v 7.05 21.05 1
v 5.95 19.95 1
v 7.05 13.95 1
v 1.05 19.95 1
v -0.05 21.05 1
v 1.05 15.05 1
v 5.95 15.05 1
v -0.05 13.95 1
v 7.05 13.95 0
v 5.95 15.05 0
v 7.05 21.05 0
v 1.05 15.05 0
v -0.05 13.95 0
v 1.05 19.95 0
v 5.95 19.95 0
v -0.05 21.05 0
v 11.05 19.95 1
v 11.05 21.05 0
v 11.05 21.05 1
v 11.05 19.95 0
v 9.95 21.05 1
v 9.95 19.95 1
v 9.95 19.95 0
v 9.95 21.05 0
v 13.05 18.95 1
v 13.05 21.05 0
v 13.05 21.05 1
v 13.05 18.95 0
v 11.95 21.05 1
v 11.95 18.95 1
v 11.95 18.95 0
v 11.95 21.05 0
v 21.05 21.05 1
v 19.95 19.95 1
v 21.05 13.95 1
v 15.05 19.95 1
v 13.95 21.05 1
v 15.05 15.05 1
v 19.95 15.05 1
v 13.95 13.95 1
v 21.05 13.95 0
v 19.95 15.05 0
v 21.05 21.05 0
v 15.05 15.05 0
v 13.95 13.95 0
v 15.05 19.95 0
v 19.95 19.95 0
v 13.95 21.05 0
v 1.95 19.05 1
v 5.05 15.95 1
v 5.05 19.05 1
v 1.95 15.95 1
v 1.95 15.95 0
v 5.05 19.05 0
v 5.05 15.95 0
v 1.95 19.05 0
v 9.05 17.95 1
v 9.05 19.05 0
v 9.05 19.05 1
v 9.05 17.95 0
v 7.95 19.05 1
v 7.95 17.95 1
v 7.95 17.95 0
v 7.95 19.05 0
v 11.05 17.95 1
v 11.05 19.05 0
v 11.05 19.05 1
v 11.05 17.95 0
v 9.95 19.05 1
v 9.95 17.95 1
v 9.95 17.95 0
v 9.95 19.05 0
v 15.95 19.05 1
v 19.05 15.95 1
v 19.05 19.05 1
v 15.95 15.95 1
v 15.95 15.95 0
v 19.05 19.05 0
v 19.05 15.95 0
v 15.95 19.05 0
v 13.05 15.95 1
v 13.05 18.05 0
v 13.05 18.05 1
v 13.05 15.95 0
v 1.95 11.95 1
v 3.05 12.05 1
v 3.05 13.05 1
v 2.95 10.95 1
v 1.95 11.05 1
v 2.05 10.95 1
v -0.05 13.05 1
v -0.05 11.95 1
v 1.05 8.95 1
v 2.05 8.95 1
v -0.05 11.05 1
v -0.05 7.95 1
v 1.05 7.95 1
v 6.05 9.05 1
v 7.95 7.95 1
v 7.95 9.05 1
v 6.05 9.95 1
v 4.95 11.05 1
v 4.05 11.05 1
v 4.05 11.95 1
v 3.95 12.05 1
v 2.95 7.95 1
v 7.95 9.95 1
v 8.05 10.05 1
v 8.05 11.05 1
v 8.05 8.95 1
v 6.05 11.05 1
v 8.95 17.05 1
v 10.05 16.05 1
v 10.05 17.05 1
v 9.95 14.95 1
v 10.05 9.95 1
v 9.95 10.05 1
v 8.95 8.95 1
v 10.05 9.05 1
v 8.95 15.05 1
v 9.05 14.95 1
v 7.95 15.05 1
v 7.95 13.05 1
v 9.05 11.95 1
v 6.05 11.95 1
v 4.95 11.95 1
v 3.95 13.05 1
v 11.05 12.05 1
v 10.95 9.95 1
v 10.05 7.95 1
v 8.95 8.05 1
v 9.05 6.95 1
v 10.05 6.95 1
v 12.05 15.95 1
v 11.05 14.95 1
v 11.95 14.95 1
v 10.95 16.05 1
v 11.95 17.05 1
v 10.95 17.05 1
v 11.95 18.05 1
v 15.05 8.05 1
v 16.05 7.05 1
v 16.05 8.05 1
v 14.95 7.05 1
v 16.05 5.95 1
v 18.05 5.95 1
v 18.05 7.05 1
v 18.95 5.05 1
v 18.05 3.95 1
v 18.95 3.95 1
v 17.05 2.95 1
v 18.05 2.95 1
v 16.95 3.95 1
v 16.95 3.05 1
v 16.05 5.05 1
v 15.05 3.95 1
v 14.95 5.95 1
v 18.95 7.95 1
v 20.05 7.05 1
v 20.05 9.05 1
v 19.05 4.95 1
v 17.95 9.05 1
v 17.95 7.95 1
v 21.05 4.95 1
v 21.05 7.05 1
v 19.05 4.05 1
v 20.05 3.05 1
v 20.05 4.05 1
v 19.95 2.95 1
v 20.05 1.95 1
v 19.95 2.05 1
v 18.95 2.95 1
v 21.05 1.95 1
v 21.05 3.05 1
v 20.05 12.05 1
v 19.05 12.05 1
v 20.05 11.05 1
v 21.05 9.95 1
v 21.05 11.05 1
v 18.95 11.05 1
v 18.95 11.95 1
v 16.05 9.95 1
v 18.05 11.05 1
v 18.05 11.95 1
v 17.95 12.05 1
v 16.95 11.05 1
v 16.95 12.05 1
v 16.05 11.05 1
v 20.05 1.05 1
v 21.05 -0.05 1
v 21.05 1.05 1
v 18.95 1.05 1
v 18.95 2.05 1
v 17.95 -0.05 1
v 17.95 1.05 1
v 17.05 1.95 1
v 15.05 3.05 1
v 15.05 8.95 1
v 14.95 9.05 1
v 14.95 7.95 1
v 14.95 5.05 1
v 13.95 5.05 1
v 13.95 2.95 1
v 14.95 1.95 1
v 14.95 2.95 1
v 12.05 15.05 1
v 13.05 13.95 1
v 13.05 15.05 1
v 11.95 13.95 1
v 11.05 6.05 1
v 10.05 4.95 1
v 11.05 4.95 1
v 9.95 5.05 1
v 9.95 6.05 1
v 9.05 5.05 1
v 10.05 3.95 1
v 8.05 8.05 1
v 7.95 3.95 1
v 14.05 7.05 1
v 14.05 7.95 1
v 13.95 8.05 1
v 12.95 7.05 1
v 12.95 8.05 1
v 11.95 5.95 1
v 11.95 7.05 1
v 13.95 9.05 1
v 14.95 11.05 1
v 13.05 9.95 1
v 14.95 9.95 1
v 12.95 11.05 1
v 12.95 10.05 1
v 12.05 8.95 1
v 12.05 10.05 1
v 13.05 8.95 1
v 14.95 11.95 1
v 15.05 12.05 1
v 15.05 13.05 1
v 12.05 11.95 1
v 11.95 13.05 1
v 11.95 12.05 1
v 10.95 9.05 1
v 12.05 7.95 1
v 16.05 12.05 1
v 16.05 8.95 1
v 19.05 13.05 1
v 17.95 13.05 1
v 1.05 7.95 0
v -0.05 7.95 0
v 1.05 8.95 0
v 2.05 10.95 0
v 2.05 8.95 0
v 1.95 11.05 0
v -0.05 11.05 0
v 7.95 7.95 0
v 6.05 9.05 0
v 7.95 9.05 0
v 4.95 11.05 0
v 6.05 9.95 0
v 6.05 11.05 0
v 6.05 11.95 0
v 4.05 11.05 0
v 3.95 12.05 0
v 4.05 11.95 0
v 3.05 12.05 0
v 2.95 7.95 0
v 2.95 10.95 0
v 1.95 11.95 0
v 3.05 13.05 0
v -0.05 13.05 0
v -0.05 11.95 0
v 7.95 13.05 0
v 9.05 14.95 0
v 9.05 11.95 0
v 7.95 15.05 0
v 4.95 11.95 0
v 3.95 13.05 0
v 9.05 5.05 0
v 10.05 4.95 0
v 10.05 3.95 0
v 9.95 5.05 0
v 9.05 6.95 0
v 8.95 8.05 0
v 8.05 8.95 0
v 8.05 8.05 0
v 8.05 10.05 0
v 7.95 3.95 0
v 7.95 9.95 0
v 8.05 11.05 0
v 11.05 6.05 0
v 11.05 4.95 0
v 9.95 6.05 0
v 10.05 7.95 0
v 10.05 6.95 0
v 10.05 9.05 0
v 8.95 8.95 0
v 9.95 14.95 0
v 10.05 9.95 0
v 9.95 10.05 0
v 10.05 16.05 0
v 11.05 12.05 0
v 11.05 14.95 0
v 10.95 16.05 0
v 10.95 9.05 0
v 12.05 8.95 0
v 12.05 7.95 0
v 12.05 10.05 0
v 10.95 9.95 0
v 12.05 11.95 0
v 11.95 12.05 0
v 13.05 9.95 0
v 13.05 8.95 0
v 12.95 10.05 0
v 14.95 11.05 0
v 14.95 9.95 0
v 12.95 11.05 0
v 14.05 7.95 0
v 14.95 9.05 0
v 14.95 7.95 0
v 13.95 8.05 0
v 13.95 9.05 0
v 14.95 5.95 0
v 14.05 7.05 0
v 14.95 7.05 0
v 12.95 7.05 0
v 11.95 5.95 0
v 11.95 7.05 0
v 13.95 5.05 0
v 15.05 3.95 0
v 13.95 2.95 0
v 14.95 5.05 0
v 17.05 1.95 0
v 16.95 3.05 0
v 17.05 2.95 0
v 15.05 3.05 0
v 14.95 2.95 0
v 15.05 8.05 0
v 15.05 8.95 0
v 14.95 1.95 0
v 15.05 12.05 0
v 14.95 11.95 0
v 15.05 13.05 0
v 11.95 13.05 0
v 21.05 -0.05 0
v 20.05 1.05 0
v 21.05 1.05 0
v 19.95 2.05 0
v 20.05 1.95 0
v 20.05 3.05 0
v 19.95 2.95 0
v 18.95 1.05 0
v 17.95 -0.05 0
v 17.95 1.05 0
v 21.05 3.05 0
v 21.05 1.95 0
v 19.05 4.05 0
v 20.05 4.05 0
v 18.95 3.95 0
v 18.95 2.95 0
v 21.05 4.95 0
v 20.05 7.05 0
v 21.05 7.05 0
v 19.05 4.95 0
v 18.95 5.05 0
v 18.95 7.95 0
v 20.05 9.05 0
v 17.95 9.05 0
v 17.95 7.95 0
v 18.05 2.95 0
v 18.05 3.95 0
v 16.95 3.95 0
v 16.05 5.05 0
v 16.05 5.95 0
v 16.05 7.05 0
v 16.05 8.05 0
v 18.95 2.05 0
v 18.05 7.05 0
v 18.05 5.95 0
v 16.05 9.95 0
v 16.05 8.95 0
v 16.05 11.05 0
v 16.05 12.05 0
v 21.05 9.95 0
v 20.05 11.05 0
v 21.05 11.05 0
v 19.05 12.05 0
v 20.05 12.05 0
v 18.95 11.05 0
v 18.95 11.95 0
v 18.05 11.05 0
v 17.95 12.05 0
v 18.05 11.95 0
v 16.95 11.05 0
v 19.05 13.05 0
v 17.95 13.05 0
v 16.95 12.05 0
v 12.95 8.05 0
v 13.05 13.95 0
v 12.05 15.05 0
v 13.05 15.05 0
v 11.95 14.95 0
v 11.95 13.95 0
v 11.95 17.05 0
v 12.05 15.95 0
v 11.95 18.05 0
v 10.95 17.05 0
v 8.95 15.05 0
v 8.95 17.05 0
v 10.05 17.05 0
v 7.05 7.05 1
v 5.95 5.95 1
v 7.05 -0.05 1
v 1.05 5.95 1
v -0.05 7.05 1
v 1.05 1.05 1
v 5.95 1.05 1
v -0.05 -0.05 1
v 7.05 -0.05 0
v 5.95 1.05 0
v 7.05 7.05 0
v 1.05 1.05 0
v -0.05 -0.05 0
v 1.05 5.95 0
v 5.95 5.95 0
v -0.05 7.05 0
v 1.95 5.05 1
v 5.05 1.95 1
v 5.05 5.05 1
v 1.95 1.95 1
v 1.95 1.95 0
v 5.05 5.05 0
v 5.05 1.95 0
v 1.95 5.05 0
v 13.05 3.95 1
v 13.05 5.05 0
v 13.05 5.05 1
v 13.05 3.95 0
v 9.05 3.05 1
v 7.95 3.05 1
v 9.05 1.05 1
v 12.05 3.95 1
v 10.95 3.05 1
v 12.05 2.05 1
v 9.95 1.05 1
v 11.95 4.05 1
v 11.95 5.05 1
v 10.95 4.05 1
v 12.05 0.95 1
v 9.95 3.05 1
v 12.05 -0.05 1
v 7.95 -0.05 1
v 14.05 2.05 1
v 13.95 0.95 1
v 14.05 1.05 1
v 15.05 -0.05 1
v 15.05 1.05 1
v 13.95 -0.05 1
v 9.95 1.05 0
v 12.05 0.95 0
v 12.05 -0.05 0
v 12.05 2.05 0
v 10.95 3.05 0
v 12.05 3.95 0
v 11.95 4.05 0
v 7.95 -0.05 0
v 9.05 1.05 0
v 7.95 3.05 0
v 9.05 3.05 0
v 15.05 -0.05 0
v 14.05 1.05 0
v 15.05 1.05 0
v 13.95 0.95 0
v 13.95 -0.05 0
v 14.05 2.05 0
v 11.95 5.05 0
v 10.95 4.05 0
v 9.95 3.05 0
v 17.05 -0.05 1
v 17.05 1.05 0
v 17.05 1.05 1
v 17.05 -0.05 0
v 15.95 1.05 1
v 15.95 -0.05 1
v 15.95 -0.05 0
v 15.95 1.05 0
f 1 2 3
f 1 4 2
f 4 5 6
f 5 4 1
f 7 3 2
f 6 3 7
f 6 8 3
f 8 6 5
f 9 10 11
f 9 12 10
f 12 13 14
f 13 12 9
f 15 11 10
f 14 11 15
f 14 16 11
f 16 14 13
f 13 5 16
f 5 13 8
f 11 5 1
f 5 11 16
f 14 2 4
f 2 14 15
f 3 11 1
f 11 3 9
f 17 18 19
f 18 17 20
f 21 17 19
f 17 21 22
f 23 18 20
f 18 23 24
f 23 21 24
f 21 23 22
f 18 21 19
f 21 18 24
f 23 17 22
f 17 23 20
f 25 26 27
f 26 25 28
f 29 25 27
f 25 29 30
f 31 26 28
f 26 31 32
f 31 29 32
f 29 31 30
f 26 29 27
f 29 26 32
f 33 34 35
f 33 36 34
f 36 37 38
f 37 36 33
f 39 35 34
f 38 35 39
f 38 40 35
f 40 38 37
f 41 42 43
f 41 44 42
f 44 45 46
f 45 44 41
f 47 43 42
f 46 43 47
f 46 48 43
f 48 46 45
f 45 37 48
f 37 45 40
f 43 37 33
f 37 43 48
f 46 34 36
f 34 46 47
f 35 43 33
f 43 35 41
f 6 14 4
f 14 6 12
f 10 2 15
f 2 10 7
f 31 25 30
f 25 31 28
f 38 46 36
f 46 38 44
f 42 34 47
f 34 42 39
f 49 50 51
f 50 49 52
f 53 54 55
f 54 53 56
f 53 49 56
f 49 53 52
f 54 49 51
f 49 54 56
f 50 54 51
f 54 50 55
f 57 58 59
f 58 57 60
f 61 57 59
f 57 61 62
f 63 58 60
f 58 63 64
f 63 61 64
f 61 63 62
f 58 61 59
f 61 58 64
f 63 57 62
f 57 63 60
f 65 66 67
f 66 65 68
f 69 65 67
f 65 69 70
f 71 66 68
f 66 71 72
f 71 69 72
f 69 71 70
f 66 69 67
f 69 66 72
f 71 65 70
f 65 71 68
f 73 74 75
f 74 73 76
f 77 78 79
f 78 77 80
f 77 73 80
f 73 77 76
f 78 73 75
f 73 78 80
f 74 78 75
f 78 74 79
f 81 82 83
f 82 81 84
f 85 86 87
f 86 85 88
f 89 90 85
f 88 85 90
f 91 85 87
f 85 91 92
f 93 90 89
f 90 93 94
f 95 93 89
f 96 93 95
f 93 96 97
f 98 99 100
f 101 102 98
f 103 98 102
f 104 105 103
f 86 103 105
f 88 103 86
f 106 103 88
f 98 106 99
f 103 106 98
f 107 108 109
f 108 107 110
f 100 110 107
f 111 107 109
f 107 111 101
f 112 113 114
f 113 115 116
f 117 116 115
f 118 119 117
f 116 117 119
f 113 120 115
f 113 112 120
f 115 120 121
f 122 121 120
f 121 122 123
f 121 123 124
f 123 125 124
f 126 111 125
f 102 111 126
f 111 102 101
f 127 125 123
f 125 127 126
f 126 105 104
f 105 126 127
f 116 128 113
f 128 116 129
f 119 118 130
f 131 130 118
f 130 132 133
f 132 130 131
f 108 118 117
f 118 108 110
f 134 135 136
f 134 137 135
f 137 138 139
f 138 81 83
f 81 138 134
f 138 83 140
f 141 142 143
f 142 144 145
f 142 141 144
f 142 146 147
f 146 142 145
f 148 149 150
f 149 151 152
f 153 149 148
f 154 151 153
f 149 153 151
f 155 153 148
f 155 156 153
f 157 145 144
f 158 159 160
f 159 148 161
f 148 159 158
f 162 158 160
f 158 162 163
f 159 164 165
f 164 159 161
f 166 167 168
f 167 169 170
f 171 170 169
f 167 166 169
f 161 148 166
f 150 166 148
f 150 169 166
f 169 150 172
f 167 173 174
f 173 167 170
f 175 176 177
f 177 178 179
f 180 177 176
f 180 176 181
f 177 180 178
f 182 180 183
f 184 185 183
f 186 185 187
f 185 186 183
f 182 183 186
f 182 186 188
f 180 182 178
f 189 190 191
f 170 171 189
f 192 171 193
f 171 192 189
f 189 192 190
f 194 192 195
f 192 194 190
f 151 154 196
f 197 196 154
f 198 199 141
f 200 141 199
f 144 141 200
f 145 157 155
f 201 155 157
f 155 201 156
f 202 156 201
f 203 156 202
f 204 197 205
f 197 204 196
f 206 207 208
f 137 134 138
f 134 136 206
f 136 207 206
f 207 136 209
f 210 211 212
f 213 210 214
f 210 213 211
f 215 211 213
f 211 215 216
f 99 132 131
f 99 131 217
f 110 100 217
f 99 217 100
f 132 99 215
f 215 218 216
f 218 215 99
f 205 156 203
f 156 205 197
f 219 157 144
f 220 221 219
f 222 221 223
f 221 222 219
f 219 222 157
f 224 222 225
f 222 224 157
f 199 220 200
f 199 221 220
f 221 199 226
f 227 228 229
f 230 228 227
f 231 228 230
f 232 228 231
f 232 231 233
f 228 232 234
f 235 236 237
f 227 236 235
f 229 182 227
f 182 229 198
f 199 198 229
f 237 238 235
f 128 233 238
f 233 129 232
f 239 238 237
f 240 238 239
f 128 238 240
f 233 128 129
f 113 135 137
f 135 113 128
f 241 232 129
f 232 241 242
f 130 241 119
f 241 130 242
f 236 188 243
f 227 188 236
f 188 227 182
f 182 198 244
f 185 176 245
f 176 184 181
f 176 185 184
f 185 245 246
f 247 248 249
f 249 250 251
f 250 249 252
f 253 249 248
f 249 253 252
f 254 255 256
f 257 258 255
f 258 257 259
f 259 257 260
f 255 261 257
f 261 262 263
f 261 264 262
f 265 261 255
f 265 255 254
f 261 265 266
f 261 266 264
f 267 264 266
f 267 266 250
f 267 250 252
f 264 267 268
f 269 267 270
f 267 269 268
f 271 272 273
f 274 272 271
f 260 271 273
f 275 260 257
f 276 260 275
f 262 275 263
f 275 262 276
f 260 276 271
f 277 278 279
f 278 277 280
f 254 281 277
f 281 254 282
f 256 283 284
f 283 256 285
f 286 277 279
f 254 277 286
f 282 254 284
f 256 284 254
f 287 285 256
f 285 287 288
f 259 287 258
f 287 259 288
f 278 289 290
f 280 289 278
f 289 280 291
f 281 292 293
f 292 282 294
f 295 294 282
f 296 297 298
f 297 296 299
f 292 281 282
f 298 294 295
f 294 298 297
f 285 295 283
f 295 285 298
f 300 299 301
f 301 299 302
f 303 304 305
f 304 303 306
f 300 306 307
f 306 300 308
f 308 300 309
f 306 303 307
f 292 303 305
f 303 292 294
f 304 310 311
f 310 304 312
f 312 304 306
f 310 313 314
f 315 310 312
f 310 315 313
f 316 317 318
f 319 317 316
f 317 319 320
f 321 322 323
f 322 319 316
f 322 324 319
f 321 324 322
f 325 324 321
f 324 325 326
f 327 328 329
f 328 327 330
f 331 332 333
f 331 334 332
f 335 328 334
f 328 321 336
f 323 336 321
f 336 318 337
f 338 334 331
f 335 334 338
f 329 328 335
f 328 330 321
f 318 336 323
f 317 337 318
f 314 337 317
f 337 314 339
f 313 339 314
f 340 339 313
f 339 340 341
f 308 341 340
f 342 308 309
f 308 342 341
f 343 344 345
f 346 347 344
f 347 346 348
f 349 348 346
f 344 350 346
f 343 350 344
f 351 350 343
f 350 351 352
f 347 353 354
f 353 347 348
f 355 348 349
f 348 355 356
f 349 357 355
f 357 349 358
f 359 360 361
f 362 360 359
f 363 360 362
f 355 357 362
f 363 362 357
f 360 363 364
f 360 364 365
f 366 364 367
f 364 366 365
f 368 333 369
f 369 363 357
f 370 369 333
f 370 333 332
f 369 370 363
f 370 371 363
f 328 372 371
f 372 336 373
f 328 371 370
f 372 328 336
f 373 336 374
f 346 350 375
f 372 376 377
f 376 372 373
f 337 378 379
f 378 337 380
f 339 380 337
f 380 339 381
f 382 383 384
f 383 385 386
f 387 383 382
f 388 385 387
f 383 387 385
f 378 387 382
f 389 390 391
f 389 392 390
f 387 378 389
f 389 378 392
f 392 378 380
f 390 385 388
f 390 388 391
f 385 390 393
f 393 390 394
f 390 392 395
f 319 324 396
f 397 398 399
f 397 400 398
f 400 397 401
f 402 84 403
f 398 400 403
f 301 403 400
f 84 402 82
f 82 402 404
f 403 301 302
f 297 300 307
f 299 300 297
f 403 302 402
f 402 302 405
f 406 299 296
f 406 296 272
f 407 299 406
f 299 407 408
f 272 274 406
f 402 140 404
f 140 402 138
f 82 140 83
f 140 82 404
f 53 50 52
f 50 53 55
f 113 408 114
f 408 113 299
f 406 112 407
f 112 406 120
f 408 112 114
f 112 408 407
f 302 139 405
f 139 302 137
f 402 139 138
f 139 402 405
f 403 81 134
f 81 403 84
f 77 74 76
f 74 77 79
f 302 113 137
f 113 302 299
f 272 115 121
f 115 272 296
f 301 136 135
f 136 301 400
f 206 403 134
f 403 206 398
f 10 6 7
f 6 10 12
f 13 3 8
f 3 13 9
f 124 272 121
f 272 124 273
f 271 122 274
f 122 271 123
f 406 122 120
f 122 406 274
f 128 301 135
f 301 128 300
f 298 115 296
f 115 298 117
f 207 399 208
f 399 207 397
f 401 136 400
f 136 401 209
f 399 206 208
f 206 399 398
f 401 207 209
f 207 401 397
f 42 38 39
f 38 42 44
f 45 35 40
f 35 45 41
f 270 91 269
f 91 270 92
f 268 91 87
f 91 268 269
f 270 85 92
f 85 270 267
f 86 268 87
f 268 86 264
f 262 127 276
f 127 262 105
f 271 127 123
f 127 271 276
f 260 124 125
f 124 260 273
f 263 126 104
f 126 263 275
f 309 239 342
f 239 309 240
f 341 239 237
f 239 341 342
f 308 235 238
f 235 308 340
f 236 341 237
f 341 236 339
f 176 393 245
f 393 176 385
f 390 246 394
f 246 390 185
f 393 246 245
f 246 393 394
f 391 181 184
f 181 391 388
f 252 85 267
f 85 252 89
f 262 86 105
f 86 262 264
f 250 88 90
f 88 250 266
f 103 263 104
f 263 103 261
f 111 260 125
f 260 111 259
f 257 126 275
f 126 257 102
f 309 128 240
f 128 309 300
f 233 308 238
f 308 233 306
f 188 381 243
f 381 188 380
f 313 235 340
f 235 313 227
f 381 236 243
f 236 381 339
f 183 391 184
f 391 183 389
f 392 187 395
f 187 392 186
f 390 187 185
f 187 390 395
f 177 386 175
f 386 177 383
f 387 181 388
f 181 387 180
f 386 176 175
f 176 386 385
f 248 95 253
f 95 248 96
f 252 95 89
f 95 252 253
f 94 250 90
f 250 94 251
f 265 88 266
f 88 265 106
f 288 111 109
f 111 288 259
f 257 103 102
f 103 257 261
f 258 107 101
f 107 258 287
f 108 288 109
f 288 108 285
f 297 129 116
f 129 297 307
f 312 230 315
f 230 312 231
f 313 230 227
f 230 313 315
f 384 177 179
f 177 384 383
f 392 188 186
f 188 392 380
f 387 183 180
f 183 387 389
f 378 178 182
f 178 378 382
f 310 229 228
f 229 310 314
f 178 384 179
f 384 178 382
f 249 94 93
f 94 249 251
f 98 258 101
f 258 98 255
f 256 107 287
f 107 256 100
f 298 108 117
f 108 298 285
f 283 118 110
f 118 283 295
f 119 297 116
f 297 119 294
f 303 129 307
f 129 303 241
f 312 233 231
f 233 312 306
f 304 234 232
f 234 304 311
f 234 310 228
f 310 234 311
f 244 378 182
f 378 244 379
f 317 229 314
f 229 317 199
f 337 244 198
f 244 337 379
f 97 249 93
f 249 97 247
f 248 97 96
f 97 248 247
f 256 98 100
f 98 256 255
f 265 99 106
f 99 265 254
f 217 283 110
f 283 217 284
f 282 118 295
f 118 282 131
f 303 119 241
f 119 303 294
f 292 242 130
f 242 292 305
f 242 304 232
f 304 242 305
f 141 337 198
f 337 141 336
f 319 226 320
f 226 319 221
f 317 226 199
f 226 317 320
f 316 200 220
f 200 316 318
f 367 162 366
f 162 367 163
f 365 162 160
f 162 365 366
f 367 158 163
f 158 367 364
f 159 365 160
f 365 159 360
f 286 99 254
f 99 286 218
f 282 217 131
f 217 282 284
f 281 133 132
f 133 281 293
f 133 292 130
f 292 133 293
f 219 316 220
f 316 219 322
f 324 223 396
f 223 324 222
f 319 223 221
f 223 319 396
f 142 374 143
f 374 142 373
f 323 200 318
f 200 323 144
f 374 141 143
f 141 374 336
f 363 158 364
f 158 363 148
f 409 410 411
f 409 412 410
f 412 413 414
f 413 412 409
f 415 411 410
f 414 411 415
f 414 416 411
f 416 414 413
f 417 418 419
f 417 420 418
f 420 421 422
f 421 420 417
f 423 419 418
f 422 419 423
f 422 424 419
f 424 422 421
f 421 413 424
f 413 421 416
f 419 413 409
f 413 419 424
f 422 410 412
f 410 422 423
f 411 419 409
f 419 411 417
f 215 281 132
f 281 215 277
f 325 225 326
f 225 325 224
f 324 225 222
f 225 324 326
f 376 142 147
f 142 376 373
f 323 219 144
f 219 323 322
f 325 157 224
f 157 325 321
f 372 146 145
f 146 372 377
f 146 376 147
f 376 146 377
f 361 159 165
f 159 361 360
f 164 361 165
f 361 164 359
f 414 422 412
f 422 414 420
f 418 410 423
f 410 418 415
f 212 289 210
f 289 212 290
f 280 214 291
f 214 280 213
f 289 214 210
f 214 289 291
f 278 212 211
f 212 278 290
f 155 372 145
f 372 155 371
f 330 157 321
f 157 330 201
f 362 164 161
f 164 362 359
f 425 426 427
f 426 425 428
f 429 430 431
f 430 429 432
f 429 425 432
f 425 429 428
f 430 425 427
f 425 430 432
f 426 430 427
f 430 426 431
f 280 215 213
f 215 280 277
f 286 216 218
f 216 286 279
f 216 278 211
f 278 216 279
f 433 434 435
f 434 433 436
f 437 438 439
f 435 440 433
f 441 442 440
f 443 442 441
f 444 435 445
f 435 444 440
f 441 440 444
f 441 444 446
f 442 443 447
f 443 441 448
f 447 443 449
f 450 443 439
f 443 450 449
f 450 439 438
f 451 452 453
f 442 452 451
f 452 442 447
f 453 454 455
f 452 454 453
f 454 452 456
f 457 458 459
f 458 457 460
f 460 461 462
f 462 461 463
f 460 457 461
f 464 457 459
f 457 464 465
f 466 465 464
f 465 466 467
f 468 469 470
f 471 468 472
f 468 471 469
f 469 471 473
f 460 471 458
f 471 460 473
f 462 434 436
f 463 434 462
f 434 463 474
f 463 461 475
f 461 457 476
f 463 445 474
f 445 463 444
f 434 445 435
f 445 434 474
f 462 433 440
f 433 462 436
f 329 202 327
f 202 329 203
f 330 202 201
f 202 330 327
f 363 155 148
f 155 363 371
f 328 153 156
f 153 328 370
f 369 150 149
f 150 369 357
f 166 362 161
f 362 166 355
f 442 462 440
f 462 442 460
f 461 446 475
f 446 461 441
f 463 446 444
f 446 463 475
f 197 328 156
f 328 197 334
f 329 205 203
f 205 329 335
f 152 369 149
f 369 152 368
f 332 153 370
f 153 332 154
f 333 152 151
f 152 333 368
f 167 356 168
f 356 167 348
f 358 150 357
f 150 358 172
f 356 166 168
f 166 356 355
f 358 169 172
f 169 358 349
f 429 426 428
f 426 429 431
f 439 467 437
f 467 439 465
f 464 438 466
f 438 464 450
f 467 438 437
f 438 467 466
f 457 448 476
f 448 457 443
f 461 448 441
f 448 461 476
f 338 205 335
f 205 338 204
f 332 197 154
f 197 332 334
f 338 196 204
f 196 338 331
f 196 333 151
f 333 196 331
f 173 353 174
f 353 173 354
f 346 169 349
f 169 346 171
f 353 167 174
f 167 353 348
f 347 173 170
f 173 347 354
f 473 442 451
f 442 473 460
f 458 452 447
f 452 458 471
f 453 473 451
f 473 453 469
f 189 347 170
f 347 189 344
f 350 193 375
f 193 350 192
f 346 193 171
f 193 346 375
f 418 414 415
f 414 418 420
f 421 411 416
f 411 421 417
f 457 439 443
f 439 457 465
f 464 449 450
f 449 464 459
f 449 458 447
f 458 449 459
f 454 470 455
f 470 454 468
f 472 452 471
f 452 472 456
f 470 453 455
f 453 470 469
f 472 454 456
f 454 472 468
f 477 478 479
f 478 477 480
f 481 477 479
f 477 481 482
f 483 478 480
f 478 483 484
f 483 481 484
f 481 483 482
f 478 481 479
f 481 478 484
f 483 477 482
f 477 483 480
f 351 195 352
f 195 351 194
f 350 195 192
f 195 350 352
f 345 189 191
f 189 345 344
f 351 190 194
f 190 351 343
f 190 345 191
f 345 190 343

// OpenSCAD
// QR code data for "MAGRATHEAN" (21 x 21)
// Generated by Altair's OpenSCAD QR Code Generator
// https://ridercz.github.io/OpenSCAD-QR/
qr_data = [[1,1,1,1,1,1,1,0,0,0,1,0,1,0,1,1,1,1,1,1,1],
           [1,0,0,0,0,0,1,0,0,0,0,0,1,0,1,0,0,0,0,0,1],
           [1,0,1,1,1,0,1,0,1,0,1,0,0,0,1,0,1,1,1,0,1],
           [1,0,1,1,1,0,1,0,0,0,0,0,1,0,1,0,1,1,1,0,1],
           [1,0,1,1,1,0,1,0,0,1,0,1,1,0,1,0,1,1,1,0,1],
           [1,0,0,0,0,0,1,0,0,1,1,1,0,0,1,0,0,0,0,0,1],
           [1,1,1,1,1,1,1,0,1,0,1,0,1,0,1,1,1,1,1,1,1],
           [0,0,0,0,0,0,0,0,1,0,1,0,0,0,0,0,0,0,0,0,0],
           [1,1,1,0,1,1,1,1,1,0,1,0,1,1,1,0,0,0,1,0,0],
           [0,0,1,1,0,1,0,0,0,0,1,1,0,0,0,1,0,1,0,1,0],
           [1,1,0,1,1,1,1,1,0,0,1,1,0,1,1,1,1,1,1,1,1],
           [1,1,0,1,1,1,0,0,1,1,0,1,1,0,0,1,0,0,0,0,0],
           [1,0,0,1,1,1,1,1,0,1,1,1,0,0,1,0,0,0,1,1,0],
           [0,0,0,0,0,0,0,0,1,1,0,0,0,1,0,1,0,0,0,1,0],
           [1,1,1,1,1,1,1,0,1,0,0,0,1,1,1,1,1,1,0,1,1],
           [1,0,0,0,0,0,1,0,1,0,1,0,0,0,0,1,0,0,0,1,1],
           [1,0,1,1,1,0,1,0,1,1,0,0,1,0,1,1,1,1,1,0,0],
           [1,0,1,1,1,0,1,0,0,0,0,1,0,0,1,0,0,1,0,1,0],
           [1,0,1,1,1,0,1,0,1,0,1,1,0,0,0,1,1,0,0,0,1],
           [1,0,0,0,0,0,1,0,1,0,1,1,1,1,0,0,0,0,0,1,0],
           [1,1,1,1,1,1,1,0,1,1,1,1,0,0,1,0,1,0,1,1,1]];

// Render QR code with default settings (module 1x1x1)
qr_render(qr_data);

// QR code rendering method
module qr_render(data, module_size = 1, height = 1) {
    maxmod = len(data) - 1;
    union() {
        for(r = [0 : maxmod]) {
            for(c = [0 : maxmod]) {
                if(data[r][c] == 1){
                    xo = c * module_size;
                    yo = (maxmod - r) * module_size;
                    translate([xo-0.05, yo-0.05, 0]) 
                        cube([module_size+0.1, module_size+0.1, height]);
                }
            }
        }
    }
}

//translate([-0.05, -0.05, -1]) cube([21.1, 21.1, 1.1]);
